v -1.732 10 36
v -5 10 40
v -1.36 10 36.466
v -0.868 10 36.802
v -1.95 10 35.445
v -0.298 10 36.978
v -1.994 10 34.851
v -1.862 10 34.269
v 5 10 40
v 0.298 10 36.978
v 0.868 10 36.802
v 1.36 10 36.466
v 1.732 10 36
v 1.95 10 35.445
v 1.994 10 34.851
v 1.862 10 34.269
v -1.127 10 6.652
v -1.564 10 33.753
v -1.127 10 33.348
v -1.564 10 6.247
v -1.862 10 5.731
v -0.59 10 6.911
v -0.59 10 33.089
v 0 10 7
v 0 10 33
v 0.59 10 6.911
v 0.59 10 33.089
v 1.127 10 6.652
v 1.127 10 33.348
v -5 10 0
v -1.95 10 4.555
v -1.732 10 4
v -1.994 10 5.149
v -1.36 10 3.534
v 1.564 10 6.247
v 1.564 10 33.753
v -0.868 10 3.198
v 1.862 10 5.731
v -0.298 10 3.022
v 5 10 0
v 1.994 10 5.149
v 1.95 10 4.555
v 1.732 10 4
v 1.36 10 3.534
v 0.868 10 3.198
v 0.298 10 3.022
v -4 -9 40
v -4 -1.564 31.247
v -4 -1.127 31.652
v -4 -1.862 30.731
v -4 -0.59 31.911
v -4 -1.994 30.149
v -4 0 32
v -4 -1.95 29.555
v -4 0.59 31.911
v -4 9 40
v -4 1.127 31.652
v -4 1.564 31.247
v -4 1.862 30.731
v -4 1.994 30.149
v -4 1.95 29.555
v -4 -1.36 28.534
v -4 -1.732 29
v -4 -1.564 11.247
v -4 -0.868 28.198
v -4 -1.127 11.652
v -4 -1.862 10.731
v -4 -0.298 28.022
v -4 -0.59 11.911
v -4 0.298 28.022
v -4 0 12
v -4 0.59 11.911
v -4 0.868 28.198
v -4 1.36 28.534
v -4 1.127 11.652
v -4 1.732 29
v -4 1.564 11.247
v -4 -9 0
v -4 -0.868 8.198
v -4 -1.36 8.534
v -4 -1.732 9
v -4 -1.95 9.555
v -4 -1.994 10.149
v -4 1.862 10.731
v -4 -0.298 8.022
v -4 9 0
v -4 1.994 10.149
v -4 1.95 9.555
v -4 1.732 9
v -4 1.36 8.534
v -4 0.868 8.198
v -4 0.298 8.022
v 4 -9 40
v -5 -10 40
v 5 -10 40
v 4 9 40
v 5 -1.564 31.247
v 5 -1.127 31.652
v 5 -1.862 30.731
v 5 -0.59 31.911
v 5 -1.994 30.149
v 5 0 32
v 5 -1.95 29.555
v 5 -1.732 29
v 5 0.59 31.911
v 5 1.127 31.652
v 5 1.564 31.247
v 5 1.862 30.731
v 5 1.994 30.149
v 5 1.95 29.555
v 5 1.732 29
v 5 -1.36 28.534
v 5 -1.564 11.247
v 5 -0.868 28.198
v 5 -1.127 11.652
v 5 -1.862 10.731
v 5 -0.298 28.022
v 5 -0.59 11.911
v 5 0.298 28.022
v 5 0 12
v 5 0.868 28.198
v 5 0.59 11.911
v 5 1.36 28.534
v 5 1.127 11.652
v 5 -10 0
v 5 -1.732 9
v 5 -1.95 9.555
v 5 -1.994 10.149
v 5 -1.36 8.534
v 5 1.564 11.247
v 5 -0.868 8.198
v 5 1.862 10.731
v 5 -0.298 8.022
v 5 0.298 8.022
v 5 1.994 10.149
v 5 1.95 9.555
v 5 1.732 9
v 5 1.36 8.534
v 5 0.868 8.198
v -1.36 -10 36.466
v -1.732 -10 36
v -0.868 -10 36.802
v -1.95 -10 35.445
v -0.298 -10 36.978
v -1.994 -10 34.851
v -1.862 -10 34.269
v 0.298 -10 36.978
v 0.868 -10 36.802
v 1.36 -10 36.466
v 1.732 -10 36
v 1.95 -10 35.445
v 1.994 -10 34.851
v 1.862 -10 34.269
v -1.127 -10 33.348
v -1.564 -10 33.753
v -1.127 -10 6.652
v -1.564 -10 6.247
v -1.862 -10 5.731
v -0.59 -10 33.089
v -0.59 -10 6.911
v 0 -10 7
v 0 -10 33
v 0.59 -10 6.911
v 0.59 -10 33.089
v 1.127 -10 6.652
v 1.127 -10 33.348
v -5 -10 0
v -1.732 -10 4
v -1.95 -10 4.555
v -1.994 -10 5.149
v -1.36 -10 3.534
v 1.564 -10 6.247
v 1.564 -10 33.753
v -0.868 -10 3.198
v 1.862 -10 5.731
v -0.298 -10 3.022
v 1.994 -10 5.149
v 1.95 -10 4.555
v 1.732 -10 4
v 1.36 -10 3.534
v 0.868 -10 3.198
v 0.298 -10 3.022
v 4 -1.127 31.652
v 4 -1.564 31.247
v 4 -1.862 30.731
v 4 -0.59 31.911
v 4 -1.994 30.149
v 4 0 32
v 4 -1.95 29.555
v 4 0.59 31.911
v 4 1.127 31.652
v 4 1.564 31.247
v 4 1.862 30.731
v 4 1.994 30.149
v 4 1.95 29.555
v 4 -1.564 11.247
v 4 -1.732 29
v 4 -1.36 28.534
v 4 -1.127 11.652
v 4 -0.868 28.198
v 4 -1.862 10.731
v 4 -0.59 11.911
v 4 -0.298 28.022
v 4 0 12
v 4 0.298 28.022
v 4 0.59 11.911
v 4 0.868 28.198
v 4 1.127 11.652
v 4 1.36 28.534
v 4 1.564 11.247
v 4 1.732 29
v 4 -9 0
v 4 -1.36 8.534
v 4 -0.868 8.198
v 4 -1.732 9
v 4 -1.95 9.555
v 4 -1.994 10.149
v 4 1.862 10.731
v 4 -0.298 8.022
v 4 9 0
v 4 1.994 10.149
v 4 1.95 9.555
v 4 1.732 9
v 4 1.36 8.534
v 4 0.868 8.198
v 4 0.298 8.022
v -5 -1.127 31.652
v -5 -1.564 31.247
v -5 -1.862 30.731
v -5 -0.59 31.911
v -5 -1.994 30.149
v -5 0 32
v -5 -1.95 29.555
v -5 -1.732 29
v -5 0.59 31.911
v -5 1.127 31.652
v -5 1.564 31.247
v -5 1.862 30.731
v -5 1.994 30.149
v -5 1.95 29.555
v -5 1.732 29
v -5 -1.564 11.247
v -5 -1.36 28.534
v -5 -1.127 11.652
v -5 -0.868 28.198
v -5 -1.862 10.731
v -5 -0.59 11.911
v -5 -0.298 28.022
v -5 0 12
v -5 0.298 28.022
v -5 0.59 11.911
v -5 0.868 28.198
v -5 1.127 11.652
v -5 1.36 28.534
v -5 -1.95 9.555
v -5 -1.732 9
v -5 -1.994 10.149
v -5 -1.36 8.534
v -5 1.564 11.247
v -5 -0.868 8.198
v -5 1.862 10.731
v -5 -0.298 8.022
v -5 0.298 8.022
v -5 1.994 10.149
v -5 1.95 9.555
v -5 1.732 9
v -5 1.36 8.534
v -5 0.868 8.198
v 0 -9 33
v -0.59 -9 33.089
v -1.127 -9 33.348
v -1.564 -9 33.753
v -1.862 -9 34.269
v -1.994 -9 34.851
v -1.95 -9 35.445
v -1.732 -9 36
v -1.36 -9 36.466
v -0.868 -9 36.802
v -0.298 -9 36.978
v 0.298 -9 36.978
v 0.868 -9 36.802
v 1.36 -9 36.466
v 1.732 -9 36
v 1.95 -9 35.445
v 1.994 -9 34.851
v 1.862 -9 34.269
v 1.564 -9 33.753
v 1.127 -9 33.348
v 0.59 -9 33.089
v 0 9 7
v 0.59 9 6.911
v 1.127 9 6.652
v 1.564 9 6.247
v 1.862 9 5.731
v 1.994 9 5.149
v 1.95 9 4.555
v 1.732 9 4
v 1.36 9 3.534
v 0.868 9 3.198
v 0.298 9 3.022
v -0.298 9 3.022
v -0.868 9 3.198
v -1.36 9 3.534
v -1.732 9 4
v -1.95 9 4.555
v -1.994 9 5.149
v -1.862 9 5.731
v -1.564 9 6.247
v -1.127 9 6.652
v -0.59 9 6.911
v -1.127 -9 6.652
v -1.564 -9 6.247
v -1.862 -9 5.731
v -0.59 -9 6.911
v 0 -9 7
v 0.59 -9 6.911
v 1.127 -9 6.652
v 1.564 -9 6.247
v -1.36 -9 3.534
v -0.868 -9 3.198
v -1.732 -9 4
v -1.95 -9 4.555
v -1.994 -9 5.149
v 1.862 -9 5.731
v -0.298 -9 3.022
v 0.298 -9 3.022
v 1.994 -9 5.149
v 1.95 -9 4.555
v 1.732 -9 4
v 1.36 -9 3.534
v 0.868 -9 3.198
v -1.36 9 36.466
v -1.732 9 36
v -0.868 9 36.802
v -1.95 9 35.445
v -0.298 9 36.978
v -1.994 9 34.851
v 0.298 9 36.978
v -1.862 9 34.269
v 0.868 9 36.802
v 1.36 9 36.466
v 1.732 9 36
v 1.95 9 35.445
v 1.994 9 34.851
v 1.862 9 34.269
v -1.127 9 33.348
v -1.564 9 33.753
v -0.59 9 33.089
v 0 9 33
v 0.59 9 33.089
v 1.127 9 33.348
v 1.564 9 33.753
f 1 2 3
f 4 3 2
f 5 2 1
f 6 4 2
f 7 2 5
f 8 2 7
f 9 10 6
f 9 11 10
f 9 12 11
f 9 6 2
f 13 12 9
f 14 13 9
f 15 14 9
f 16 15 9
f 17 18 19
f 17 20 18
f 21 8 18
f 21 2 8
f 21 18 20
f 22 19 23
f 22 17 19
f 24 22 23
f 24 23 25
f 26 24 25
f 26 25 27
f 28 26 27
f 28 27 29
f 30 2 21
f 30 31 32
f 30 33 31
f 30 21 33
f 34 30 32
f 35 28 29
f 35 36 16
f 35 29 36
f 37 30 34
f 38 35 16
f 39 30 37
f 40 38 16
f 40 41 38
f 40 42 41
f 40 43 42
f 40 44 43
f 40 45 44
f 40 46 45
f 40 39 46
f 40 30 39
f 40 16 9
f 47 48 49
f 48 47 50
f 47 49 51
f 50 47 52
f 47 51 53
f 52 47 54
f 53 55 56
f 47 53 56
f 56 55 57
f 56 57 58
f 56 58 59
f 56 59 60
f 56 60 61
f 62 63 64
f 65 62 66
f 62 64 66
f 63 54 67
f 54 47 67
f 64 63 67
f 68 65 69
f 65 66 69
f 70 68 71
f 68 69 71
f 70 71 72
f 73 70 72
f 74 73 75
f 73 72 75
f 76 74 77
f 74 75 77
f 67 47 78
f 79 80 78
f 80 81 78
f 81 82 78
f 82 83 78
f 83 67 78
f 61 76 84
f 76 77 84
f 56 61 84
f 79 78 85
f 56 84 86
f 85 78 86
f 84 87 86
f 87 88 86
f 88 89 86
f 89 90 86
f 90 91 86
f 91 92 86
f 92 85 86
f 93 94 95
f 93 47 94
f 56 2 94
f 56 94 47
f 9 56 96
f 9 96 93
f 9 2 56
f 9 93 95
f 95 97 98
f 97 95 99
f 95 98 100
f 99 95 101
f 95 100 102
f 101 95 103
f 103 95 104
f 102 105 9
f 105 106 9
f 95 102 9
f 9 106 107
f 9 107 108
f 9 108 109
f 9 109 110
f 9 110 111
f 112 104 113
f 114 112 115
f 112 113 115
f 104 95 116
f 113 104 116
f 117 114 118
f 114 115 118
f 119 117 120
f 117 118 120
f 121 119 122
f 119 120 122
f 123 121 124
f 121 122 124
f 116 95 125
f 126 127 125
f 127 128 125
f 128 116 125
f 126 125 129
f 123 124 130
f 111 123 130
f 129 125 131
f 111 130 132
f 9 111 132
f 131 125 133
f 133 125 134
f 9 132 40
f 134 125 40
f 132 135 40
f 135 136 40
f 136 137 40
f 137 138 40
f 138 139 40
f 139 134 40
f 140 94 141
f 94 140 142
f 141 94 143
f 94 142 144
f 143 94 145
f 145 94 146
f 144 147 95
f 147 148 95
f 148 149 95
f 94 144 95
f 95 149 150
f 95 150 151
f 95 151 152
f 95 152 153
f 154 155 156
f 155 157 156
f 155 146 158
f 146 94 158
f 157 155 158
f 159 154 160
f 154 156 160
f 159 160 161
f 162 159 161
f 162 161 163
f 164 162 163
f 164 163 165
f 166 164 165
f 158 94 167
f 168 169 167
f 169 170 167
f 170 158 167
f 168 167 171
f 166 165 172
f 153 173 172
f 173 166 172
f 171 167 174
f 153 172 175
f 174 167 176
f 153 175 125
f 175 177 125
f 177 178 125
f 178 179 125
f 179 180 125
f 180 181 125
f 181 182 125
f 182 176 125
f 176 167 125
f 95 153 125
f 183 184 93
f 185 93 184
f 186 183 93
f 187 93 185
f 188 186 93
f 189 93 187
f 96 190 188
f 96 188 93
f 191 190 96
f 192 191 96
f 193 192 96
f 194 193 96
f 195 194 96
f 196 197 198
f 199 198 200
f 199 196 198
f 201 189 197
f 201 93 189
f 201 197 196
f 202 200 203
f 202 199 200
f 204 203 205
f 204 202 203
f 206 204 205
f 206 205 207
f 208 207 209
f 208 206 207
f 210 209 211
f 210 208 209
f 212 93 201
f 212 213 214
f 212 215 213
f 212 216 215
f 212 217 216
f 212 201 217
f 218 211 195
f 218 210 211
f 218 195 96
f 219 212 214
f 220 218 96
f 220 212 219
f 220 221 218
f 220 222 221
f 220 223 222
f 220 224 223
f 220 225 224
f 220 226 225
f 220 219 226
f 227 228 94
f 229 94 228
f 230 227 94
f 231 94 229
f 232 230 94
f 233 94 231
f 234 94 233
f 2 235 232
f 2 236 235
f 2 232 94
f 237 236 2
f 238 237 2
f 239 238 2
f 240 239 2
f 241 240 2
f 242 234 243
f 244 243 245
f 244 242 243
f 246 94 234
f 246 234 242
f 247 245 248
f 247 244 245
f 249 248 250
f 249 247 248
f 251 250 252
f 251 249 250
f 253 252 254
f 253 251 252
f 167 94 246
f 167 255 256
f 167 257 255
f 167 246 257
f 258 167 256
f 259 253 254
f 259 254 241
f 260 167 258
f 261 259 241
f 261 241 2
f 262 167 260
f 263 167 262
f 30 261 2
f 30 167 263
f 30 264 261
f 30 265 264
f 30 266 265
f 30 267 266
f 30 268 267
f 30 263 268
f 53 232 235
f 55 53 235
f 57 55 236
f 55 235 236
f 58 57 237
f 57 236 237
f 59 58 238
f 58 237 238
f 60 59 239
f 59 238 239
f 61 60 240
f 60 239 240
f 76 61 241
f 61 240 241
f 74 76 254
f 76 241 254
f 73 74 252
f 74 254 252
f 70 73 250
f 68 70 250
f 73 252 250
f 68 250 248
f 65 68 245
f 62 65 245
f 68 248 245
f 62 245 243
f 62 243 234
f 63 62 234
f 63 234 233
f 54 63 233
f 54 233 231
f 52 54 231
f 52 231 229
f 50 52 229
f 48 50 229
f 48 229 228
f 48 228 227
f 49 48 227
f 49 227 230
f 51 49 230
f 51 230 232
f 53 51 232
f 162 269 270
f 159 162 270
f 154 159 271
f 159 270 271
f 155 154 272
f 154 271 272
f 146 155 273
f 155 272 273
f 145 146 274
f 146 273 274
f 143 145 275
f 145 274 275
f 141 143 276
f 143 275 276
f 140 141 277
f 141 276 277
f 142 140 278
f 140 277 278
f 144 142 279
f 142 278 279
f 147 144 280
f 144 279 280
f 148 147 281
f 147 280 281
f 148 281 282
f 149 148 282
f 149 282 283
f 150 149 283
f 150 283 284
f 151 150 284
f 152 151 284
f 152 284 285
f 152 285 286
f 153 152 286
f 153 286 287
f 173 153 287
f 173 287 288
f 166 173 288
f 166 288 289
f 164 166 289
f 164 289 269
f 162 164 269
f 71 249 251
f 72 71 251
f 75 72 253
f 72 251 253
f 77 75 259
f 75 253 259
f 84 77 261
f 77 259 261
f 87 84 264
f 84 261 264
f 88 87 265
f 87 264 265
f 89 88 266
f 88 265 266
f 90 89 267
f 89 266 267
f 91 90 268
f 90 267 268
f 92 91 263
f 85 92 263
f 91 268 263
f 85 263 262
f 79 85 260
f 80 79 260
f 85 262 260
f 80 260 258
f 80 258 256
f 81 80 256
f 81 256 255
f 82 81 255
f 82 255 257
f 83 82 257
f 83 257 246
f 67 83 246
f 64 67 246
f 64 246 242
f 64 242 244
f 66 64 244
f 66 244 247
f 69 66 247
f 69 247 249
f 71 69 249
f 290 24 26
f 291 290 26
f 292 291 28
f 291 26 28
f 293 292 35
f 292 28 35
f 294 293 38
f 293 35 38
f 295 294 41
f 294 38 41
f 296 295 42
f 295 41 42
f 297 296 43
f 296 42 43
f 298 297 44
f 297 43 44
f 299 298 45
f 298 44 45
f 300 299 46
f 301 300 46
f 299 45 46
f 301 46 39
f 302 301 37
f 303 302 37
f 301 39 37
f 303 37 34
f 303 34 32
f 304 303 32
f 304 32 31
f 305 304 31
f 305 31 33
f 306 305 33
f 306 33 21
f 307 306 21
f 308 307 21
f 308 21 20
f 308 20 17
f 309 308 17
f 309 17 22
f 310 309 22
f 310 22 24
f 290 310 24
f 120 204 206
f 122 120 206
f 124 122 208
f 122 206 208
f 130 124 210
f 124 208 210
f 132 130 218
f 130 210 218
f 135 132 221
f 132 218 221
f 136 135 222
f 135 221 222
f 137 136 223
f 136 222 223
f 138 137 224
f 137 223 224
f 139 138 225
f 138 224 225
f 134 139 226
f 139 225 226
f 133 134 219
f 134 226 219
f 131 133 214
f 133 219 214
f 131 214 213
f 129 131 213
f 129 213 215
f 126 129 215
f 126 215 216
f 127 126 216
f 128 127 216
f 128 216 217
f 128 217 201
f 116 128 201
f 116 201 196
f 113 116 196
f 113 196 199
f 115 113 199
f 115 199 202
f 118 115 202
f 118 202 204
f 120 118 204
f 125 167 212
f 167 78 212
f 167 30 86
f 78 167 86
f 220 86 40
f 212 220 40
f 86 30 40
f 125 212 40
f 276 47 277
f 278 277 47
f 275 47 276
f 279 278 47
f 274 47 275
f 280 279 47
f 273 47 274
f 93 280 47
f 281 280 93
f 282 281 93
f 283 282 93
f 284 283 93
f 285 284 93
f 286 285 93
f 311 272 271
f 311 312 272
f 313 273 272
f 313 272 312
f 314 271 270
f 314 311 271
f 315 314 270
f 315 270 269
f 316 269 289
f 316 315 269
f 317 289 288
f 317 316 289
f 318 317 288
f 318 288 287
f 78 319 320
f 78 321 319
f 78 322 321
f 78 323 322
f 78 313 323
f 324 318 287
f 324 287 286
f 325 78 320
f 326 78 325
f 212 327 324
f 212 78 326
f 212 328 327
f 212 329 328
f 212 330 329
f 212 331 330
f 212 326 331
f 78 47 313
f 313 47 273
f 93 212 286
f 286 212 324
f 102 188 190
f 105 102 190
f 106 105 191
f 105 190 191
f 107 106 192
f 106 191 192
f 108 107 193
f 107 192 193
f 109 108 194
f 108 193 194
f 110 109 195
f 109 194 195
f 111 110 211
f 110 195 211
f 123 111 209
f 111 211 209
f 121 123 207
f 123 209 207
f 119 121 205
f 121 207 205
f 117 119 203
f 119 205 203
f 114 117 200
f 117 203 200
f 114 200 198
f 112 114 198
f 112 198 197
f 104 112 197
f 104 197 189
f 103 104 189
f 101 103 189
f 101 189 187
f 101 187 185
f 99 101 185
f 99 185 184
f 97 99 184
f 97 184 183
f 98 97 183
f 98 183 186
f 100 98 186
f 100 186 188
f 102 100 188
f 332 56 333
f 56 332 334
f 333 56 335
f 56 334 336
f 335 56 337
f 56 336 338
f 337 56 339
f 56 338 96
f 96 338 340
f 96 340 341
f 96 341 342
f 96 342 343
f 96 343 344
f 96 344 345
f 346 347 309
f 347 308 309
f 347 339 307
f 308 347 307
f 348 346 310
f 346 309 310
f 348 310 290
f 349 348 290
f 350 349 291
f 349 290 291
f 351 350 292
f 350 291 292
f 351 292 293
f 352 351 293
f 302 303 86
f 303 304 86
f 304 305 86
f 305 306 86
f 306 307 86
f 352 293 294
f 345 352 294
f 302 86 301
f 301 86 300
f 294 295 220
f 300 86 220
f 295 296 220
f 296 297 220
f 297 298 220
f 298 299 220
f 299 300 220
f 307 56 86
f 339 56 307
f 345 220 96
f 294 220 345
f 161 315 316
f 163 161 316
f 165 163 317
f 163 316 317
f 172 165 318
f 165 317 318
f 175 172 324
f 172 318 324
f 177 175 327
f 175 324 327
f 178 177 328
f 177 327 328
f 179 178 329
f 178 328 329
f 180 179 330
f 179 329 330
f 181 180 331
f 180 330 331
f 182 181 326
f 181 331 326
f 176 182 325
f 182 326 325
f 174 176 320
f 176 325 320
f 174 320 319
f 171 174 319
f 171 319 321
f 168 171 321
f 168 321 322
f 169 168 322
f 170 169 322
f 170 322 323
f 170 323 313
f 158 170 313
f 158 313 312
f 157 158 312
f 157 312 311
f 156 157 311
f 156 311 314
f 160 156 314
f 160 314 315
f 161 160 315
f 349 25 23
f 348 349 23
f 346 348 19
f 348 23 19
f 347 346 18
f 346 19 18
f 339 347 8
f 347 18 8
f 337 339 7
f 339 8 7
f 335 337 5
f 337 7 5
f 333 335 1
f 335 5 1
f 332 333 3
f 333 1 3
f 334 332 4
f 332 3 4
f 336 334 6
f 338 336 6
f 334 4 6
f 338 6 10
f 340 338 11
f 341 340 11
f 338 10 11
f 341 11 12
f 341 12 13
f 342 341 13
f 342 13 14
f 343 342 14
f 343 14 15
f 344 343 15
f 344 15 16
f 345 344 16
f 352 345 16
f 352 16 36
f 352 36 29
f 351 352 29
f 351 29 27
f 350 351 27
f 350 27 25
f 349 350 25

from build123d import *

# Parameters (mm, degrees)
SKETCH_1_W          = 10
SKETCH_1_H          = 20
SKETCH_1_W_2        = 8
SKETCH_1_H_2        = 18
EXTRUDE_1_DEPTH     = 40
SKETCH_2_R          = 2
CUT_EXTRUDE_1_DEPTH = 43.426406871
SKETCH_3_R          = 2
CUT_EXTRUDE_2_DEPTH = 46


with BuildPart() as part:
    # ｽｹｯﾁ1 → 押し出し-薄板1 (new body)
    with BuildSketch(Plane.XY):
        Rectangle(SKETCH_1_W, SKETCH_1_H)
        Rectangle(SKETCH_1_W_2, SKETCH_1_H_2, mode=Mode.SUBTRACT)
    extrude(amount=EXTRUDE_1_DEPTH)

    # ｽｹｯﾁ2 → ｶｯﾄ - 押し出し1 (cut, through all)
    with BuildSketch(Plane.ZY.offset(5)):
        with Locations((10, 0)):
            Circle(SKETCH_2_R)
        with Locations((30, 0)):
            Circle(SKETCH_2_R)
    extrude(amount=-CUT_EXTRUDE_1_DEPTH, mode=Mode.SUBTRACT)

    # ｽｹｯﾁ3 → ｶｯﾄ - 押し出し2 (cut, through all)
    with BuildSketch(Plane(origin=(0, 10, 0), x_dir=(1, 0, 0), z_dir=(0, 1, 0))):
        with Locations(Location((0, -5, 0), (0, 0, 270))):
            Circle(SKETCH_3_R)
        with Locations(Location((0, -35, 0), (0, 0, 90))):
            Circle(SKETCH_3_R)
    extrude(amount=-CUT_EXTRUDE_2_DEPTH, mode=Mode.SUBTRACT)


solid = part.part
